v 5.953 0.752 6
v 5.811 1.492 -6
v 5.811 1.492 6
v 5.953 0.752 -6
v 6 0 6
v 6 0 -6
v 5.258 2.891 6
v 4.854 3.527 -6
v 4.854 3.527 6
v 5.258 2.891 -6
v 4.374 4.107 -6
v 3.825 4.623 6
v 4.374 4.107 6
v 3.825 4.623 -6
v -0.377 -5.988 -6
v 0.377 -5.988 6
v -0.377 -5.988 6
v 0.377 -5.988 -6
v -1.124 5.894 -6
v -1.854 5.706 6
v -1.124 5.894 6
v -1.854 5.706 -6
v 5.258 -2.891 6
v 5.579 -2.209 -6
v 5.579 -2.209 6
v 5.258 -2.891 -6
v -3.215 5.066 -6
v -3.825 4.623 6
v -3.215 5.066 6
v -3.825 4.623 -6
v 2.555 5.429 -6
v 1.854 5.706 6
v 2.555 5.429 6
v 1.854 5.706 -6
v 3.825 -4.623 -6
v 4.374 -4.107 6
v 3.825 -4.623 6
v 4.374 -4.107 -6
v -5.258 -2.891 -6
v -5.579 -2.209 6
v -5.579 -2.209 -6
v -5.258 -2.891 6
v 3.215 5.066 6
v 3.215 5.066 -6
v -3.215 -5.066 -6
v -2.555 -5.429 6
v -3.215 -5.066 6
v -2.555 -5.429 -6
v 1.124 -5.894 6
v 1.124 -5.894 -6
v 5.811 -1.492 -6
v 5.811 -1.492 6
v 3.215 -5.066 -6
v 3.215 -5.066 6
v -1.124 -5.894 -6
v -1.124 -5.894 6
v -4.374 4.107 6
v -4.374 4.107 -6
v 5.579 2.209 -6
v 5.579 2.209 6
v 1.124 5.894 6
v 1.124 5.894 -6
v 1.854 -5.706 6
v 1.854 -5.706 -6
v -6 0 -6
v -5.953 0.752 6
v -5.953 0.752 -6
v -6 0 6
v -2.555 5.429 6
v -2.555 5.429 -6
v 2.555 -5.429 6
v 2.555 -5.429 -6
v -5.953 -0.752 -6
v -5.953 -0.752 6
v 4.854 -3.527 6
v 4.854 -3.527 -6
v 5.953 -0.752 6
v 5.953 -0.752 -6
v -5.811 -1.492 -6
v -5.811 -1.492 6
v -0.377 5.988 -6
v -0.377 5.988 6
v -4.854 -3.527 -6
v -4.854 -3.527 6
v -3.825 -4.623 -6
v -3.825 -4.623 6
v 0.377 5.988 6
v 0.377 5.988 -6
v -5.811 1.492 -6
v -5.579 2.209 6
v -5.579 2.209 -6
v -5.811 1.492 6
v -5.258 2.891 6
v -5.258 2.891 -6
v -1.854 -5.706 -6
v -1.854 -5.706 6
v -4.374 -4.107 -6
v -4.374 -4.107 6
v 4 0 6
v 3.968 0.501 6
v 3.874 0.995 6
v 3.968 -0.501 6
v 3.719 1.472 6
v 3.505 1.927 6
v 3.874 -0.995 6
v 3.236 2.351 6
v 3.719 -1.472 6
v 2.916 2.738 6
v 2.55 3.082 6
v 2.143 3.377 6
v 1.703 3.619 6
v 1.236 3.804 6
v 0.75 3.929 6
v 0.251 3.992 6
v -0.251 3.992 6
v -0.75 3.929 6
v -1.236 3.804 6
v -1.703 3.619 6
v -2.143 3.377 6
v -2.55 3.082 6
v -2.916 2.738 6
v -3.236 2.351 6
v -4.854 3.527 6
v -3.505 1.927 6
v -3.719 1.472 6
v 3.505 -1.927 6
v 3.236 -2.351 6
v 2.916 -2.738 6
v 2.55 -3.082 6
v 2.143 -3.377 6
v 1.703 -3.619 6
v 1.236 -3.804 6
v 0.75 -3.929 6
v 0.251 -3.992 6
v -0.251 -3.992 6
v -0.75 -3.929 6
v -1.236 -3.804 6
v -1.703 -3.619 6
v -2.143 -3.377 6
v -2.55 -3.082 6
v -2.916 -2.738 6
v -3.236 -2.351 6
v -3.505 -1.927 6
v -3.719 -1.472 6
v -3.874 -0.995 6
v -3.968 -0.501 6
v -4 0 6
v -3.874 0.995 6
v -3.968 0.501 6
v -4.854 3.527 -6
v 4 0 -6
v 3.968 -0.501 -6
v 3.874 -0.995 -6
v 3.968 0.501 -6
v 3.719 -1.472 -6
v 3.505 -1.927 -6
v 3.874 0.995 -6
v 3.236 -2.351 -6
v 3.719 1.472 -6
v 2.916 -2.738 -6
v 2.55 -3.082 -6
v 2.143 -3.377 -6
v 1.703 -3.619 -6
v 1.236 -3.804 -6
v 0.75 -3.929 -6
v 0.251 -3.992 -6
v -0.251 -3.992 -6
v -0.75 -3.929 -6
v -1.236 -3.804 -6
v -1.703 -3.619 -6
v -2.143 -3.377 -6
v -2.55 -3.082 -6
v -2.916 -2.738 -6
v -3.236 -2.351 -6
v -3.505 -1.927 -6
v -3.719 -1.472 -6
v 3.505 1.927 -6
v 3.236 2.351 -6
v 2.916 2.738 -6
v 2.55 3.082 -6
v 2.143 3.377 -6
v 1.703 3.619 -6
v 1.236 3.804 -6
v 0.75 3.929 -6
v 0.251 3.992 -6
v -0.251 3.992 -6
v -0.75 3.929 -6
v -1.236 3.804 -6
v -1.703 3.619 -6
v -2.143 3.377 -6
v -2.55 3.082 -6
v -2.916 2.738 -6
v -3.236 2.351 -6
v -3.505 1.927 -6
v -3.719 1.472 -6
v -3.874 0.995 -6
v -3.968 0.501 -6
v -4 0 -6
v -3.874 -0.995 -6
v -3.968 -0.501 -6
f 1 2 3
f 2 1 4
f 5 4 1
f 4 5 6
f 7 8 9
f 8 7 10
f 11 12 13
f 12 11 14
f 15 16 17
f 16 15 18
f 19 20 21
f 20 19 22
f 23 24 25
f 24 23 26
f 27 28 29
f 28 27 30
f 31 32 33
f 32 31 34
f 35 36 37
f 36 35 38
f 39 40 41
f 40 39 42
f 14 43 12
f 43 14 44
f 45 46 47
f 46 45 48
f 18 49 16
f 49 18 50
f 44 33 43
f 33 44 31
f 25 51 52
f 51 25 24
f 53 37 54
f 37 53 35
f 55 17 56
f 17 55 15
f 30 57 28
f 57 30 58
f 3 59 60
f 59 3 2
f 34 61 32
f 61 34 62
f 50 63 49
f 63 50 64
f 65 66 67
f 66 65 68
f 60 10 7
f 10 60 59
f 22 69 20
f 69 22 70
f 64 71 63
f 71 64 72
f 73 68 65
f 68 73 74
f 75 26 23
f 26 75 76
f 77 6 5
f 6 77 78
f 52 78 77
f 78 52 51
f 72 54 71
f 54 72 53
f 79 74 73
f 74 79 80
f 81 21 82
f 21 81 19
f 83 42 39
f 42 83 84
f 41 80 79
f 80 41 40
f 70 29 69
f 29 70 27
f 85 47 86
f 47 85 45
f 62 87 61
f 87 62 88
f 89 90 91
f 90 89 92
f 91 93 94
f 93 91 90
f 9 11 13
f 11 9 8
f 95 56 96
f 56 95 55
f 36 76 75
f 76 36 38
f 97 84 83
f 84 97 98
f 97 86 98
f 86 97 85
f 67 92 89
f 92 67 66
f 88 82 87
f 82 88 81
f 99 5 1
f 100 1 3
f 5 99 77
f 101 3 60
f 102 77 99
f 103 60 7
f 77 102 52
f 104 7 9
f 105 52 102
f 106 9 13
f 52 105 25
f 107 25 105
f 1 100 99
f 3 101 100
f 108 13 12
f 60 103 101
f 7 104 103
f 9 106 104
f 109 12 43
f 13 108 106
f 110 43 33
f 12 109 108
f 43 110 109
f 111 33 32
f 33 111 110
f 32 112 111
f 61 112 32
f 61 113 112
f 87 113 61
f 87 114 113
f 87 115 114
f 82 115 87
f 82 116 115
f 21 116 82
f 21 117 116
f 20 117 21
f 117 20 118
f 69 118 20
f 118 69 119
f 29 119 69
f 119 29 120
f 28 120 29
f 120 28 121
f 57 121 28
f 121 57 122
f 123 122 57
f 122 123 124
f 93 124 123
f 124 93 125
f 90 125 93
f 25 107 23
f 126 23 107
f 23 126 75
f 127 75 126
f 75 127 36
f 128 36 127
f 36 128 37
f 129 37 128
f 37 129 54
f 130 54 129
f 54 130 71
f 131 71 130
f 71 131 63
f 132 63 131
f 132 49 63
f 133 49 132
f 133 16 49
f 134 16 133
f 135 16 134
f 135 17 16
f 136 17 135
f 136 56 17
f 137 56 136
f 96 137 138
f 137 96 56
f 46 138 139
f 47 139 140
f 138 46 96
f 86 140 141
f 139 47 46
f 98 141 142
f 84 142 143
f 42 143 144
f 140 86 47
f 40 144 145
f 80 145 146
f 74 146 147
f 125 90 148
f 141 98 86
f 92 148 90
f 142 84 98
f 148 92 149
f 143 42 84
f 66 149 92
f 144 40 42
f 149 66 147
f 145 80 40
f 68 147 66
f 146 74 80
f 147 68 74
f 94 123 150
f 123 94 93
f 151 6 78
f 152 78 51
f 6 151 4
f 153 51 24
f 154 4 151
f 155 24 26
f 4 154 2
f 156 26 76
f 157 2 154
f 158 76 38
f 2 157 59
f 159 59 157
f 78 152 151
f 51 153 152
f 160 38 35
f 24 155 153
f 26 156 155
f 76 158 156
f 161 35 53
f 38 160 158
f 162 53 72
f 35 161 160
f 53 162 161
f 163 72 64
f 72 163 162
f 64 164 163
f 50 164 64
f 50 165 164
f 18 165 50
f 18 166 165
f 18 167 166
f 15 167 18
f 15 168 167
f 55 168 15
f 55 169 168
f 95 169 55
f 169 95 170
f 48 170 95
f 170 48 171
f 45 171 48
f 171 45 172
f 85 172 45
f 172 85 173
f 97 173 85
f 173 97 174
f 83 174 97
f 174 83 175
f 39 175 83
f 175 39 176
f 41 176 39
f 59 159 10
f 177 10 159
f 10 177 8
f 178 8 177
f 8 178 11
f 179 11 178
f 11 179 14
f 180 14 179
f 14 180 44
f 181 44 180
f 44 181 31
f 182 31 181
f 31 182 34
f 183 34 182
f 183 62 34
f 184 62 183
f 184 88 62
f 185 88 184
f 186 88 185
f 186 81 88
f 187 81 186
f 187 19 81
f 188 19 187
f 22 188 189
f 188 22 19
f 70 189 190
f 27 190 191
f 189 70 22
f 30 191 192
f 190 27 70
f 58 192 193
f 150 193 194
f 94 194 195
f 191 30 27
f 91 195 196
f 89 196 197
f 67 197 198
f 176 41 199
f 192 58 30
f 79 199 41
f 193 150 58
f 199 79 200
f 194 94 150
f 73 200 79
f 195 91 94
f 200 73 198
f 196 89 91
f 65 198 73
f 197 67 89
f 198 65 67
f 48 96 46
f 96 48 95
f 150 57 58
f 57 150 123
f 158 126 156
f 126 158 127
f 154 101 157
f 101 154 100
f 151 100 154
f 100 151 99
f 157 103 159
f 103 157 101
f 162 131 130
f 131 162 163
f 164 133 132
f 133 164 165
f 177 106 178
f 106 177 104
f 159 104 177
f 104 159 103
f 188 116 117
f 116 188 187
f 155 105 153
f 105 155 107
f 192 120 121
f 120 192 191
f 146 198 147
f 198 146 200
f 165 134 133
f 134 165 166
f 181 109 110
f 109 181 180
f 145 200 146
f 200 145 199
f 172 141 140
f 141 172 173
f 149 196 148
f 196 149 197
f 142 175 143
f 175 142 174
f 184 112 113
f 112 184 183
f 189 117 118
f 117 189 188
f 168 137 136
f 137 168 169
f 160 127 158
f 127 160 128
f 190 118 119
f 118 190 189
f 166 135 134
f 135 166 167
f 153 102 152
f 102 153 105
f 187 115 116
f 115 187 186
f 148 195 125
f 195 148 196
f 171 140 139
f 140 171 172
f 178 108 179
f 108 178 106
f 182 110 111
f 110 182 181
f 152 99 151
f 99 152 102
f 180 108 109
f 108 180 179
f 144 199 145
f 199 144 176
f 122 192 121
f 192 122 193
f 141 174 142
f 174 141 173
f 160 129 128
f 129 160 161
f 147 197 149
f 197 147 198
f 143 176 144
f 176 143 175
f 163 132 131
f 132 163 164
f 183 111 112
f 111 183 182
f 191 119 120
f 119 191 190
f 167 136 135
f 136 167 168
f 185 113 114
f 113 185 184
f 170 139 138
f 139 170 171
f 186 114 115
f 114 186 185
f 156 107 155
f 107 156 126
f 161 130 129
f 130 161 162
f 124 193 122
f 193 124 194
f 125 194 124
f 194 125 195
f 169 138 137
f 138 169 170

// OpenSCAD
$fn = 50;


difference() {
	union() {
		translate(v = [0, 0, -6.0000000000]) {
			cylinder(h = 12, r = 6.0000000000);
		}
	}
	union() {
		translate(v = [0, 0, -100.0000000000]) {
			cylinder(h = 200, r = 4.0000000000);
		}
	}
}
